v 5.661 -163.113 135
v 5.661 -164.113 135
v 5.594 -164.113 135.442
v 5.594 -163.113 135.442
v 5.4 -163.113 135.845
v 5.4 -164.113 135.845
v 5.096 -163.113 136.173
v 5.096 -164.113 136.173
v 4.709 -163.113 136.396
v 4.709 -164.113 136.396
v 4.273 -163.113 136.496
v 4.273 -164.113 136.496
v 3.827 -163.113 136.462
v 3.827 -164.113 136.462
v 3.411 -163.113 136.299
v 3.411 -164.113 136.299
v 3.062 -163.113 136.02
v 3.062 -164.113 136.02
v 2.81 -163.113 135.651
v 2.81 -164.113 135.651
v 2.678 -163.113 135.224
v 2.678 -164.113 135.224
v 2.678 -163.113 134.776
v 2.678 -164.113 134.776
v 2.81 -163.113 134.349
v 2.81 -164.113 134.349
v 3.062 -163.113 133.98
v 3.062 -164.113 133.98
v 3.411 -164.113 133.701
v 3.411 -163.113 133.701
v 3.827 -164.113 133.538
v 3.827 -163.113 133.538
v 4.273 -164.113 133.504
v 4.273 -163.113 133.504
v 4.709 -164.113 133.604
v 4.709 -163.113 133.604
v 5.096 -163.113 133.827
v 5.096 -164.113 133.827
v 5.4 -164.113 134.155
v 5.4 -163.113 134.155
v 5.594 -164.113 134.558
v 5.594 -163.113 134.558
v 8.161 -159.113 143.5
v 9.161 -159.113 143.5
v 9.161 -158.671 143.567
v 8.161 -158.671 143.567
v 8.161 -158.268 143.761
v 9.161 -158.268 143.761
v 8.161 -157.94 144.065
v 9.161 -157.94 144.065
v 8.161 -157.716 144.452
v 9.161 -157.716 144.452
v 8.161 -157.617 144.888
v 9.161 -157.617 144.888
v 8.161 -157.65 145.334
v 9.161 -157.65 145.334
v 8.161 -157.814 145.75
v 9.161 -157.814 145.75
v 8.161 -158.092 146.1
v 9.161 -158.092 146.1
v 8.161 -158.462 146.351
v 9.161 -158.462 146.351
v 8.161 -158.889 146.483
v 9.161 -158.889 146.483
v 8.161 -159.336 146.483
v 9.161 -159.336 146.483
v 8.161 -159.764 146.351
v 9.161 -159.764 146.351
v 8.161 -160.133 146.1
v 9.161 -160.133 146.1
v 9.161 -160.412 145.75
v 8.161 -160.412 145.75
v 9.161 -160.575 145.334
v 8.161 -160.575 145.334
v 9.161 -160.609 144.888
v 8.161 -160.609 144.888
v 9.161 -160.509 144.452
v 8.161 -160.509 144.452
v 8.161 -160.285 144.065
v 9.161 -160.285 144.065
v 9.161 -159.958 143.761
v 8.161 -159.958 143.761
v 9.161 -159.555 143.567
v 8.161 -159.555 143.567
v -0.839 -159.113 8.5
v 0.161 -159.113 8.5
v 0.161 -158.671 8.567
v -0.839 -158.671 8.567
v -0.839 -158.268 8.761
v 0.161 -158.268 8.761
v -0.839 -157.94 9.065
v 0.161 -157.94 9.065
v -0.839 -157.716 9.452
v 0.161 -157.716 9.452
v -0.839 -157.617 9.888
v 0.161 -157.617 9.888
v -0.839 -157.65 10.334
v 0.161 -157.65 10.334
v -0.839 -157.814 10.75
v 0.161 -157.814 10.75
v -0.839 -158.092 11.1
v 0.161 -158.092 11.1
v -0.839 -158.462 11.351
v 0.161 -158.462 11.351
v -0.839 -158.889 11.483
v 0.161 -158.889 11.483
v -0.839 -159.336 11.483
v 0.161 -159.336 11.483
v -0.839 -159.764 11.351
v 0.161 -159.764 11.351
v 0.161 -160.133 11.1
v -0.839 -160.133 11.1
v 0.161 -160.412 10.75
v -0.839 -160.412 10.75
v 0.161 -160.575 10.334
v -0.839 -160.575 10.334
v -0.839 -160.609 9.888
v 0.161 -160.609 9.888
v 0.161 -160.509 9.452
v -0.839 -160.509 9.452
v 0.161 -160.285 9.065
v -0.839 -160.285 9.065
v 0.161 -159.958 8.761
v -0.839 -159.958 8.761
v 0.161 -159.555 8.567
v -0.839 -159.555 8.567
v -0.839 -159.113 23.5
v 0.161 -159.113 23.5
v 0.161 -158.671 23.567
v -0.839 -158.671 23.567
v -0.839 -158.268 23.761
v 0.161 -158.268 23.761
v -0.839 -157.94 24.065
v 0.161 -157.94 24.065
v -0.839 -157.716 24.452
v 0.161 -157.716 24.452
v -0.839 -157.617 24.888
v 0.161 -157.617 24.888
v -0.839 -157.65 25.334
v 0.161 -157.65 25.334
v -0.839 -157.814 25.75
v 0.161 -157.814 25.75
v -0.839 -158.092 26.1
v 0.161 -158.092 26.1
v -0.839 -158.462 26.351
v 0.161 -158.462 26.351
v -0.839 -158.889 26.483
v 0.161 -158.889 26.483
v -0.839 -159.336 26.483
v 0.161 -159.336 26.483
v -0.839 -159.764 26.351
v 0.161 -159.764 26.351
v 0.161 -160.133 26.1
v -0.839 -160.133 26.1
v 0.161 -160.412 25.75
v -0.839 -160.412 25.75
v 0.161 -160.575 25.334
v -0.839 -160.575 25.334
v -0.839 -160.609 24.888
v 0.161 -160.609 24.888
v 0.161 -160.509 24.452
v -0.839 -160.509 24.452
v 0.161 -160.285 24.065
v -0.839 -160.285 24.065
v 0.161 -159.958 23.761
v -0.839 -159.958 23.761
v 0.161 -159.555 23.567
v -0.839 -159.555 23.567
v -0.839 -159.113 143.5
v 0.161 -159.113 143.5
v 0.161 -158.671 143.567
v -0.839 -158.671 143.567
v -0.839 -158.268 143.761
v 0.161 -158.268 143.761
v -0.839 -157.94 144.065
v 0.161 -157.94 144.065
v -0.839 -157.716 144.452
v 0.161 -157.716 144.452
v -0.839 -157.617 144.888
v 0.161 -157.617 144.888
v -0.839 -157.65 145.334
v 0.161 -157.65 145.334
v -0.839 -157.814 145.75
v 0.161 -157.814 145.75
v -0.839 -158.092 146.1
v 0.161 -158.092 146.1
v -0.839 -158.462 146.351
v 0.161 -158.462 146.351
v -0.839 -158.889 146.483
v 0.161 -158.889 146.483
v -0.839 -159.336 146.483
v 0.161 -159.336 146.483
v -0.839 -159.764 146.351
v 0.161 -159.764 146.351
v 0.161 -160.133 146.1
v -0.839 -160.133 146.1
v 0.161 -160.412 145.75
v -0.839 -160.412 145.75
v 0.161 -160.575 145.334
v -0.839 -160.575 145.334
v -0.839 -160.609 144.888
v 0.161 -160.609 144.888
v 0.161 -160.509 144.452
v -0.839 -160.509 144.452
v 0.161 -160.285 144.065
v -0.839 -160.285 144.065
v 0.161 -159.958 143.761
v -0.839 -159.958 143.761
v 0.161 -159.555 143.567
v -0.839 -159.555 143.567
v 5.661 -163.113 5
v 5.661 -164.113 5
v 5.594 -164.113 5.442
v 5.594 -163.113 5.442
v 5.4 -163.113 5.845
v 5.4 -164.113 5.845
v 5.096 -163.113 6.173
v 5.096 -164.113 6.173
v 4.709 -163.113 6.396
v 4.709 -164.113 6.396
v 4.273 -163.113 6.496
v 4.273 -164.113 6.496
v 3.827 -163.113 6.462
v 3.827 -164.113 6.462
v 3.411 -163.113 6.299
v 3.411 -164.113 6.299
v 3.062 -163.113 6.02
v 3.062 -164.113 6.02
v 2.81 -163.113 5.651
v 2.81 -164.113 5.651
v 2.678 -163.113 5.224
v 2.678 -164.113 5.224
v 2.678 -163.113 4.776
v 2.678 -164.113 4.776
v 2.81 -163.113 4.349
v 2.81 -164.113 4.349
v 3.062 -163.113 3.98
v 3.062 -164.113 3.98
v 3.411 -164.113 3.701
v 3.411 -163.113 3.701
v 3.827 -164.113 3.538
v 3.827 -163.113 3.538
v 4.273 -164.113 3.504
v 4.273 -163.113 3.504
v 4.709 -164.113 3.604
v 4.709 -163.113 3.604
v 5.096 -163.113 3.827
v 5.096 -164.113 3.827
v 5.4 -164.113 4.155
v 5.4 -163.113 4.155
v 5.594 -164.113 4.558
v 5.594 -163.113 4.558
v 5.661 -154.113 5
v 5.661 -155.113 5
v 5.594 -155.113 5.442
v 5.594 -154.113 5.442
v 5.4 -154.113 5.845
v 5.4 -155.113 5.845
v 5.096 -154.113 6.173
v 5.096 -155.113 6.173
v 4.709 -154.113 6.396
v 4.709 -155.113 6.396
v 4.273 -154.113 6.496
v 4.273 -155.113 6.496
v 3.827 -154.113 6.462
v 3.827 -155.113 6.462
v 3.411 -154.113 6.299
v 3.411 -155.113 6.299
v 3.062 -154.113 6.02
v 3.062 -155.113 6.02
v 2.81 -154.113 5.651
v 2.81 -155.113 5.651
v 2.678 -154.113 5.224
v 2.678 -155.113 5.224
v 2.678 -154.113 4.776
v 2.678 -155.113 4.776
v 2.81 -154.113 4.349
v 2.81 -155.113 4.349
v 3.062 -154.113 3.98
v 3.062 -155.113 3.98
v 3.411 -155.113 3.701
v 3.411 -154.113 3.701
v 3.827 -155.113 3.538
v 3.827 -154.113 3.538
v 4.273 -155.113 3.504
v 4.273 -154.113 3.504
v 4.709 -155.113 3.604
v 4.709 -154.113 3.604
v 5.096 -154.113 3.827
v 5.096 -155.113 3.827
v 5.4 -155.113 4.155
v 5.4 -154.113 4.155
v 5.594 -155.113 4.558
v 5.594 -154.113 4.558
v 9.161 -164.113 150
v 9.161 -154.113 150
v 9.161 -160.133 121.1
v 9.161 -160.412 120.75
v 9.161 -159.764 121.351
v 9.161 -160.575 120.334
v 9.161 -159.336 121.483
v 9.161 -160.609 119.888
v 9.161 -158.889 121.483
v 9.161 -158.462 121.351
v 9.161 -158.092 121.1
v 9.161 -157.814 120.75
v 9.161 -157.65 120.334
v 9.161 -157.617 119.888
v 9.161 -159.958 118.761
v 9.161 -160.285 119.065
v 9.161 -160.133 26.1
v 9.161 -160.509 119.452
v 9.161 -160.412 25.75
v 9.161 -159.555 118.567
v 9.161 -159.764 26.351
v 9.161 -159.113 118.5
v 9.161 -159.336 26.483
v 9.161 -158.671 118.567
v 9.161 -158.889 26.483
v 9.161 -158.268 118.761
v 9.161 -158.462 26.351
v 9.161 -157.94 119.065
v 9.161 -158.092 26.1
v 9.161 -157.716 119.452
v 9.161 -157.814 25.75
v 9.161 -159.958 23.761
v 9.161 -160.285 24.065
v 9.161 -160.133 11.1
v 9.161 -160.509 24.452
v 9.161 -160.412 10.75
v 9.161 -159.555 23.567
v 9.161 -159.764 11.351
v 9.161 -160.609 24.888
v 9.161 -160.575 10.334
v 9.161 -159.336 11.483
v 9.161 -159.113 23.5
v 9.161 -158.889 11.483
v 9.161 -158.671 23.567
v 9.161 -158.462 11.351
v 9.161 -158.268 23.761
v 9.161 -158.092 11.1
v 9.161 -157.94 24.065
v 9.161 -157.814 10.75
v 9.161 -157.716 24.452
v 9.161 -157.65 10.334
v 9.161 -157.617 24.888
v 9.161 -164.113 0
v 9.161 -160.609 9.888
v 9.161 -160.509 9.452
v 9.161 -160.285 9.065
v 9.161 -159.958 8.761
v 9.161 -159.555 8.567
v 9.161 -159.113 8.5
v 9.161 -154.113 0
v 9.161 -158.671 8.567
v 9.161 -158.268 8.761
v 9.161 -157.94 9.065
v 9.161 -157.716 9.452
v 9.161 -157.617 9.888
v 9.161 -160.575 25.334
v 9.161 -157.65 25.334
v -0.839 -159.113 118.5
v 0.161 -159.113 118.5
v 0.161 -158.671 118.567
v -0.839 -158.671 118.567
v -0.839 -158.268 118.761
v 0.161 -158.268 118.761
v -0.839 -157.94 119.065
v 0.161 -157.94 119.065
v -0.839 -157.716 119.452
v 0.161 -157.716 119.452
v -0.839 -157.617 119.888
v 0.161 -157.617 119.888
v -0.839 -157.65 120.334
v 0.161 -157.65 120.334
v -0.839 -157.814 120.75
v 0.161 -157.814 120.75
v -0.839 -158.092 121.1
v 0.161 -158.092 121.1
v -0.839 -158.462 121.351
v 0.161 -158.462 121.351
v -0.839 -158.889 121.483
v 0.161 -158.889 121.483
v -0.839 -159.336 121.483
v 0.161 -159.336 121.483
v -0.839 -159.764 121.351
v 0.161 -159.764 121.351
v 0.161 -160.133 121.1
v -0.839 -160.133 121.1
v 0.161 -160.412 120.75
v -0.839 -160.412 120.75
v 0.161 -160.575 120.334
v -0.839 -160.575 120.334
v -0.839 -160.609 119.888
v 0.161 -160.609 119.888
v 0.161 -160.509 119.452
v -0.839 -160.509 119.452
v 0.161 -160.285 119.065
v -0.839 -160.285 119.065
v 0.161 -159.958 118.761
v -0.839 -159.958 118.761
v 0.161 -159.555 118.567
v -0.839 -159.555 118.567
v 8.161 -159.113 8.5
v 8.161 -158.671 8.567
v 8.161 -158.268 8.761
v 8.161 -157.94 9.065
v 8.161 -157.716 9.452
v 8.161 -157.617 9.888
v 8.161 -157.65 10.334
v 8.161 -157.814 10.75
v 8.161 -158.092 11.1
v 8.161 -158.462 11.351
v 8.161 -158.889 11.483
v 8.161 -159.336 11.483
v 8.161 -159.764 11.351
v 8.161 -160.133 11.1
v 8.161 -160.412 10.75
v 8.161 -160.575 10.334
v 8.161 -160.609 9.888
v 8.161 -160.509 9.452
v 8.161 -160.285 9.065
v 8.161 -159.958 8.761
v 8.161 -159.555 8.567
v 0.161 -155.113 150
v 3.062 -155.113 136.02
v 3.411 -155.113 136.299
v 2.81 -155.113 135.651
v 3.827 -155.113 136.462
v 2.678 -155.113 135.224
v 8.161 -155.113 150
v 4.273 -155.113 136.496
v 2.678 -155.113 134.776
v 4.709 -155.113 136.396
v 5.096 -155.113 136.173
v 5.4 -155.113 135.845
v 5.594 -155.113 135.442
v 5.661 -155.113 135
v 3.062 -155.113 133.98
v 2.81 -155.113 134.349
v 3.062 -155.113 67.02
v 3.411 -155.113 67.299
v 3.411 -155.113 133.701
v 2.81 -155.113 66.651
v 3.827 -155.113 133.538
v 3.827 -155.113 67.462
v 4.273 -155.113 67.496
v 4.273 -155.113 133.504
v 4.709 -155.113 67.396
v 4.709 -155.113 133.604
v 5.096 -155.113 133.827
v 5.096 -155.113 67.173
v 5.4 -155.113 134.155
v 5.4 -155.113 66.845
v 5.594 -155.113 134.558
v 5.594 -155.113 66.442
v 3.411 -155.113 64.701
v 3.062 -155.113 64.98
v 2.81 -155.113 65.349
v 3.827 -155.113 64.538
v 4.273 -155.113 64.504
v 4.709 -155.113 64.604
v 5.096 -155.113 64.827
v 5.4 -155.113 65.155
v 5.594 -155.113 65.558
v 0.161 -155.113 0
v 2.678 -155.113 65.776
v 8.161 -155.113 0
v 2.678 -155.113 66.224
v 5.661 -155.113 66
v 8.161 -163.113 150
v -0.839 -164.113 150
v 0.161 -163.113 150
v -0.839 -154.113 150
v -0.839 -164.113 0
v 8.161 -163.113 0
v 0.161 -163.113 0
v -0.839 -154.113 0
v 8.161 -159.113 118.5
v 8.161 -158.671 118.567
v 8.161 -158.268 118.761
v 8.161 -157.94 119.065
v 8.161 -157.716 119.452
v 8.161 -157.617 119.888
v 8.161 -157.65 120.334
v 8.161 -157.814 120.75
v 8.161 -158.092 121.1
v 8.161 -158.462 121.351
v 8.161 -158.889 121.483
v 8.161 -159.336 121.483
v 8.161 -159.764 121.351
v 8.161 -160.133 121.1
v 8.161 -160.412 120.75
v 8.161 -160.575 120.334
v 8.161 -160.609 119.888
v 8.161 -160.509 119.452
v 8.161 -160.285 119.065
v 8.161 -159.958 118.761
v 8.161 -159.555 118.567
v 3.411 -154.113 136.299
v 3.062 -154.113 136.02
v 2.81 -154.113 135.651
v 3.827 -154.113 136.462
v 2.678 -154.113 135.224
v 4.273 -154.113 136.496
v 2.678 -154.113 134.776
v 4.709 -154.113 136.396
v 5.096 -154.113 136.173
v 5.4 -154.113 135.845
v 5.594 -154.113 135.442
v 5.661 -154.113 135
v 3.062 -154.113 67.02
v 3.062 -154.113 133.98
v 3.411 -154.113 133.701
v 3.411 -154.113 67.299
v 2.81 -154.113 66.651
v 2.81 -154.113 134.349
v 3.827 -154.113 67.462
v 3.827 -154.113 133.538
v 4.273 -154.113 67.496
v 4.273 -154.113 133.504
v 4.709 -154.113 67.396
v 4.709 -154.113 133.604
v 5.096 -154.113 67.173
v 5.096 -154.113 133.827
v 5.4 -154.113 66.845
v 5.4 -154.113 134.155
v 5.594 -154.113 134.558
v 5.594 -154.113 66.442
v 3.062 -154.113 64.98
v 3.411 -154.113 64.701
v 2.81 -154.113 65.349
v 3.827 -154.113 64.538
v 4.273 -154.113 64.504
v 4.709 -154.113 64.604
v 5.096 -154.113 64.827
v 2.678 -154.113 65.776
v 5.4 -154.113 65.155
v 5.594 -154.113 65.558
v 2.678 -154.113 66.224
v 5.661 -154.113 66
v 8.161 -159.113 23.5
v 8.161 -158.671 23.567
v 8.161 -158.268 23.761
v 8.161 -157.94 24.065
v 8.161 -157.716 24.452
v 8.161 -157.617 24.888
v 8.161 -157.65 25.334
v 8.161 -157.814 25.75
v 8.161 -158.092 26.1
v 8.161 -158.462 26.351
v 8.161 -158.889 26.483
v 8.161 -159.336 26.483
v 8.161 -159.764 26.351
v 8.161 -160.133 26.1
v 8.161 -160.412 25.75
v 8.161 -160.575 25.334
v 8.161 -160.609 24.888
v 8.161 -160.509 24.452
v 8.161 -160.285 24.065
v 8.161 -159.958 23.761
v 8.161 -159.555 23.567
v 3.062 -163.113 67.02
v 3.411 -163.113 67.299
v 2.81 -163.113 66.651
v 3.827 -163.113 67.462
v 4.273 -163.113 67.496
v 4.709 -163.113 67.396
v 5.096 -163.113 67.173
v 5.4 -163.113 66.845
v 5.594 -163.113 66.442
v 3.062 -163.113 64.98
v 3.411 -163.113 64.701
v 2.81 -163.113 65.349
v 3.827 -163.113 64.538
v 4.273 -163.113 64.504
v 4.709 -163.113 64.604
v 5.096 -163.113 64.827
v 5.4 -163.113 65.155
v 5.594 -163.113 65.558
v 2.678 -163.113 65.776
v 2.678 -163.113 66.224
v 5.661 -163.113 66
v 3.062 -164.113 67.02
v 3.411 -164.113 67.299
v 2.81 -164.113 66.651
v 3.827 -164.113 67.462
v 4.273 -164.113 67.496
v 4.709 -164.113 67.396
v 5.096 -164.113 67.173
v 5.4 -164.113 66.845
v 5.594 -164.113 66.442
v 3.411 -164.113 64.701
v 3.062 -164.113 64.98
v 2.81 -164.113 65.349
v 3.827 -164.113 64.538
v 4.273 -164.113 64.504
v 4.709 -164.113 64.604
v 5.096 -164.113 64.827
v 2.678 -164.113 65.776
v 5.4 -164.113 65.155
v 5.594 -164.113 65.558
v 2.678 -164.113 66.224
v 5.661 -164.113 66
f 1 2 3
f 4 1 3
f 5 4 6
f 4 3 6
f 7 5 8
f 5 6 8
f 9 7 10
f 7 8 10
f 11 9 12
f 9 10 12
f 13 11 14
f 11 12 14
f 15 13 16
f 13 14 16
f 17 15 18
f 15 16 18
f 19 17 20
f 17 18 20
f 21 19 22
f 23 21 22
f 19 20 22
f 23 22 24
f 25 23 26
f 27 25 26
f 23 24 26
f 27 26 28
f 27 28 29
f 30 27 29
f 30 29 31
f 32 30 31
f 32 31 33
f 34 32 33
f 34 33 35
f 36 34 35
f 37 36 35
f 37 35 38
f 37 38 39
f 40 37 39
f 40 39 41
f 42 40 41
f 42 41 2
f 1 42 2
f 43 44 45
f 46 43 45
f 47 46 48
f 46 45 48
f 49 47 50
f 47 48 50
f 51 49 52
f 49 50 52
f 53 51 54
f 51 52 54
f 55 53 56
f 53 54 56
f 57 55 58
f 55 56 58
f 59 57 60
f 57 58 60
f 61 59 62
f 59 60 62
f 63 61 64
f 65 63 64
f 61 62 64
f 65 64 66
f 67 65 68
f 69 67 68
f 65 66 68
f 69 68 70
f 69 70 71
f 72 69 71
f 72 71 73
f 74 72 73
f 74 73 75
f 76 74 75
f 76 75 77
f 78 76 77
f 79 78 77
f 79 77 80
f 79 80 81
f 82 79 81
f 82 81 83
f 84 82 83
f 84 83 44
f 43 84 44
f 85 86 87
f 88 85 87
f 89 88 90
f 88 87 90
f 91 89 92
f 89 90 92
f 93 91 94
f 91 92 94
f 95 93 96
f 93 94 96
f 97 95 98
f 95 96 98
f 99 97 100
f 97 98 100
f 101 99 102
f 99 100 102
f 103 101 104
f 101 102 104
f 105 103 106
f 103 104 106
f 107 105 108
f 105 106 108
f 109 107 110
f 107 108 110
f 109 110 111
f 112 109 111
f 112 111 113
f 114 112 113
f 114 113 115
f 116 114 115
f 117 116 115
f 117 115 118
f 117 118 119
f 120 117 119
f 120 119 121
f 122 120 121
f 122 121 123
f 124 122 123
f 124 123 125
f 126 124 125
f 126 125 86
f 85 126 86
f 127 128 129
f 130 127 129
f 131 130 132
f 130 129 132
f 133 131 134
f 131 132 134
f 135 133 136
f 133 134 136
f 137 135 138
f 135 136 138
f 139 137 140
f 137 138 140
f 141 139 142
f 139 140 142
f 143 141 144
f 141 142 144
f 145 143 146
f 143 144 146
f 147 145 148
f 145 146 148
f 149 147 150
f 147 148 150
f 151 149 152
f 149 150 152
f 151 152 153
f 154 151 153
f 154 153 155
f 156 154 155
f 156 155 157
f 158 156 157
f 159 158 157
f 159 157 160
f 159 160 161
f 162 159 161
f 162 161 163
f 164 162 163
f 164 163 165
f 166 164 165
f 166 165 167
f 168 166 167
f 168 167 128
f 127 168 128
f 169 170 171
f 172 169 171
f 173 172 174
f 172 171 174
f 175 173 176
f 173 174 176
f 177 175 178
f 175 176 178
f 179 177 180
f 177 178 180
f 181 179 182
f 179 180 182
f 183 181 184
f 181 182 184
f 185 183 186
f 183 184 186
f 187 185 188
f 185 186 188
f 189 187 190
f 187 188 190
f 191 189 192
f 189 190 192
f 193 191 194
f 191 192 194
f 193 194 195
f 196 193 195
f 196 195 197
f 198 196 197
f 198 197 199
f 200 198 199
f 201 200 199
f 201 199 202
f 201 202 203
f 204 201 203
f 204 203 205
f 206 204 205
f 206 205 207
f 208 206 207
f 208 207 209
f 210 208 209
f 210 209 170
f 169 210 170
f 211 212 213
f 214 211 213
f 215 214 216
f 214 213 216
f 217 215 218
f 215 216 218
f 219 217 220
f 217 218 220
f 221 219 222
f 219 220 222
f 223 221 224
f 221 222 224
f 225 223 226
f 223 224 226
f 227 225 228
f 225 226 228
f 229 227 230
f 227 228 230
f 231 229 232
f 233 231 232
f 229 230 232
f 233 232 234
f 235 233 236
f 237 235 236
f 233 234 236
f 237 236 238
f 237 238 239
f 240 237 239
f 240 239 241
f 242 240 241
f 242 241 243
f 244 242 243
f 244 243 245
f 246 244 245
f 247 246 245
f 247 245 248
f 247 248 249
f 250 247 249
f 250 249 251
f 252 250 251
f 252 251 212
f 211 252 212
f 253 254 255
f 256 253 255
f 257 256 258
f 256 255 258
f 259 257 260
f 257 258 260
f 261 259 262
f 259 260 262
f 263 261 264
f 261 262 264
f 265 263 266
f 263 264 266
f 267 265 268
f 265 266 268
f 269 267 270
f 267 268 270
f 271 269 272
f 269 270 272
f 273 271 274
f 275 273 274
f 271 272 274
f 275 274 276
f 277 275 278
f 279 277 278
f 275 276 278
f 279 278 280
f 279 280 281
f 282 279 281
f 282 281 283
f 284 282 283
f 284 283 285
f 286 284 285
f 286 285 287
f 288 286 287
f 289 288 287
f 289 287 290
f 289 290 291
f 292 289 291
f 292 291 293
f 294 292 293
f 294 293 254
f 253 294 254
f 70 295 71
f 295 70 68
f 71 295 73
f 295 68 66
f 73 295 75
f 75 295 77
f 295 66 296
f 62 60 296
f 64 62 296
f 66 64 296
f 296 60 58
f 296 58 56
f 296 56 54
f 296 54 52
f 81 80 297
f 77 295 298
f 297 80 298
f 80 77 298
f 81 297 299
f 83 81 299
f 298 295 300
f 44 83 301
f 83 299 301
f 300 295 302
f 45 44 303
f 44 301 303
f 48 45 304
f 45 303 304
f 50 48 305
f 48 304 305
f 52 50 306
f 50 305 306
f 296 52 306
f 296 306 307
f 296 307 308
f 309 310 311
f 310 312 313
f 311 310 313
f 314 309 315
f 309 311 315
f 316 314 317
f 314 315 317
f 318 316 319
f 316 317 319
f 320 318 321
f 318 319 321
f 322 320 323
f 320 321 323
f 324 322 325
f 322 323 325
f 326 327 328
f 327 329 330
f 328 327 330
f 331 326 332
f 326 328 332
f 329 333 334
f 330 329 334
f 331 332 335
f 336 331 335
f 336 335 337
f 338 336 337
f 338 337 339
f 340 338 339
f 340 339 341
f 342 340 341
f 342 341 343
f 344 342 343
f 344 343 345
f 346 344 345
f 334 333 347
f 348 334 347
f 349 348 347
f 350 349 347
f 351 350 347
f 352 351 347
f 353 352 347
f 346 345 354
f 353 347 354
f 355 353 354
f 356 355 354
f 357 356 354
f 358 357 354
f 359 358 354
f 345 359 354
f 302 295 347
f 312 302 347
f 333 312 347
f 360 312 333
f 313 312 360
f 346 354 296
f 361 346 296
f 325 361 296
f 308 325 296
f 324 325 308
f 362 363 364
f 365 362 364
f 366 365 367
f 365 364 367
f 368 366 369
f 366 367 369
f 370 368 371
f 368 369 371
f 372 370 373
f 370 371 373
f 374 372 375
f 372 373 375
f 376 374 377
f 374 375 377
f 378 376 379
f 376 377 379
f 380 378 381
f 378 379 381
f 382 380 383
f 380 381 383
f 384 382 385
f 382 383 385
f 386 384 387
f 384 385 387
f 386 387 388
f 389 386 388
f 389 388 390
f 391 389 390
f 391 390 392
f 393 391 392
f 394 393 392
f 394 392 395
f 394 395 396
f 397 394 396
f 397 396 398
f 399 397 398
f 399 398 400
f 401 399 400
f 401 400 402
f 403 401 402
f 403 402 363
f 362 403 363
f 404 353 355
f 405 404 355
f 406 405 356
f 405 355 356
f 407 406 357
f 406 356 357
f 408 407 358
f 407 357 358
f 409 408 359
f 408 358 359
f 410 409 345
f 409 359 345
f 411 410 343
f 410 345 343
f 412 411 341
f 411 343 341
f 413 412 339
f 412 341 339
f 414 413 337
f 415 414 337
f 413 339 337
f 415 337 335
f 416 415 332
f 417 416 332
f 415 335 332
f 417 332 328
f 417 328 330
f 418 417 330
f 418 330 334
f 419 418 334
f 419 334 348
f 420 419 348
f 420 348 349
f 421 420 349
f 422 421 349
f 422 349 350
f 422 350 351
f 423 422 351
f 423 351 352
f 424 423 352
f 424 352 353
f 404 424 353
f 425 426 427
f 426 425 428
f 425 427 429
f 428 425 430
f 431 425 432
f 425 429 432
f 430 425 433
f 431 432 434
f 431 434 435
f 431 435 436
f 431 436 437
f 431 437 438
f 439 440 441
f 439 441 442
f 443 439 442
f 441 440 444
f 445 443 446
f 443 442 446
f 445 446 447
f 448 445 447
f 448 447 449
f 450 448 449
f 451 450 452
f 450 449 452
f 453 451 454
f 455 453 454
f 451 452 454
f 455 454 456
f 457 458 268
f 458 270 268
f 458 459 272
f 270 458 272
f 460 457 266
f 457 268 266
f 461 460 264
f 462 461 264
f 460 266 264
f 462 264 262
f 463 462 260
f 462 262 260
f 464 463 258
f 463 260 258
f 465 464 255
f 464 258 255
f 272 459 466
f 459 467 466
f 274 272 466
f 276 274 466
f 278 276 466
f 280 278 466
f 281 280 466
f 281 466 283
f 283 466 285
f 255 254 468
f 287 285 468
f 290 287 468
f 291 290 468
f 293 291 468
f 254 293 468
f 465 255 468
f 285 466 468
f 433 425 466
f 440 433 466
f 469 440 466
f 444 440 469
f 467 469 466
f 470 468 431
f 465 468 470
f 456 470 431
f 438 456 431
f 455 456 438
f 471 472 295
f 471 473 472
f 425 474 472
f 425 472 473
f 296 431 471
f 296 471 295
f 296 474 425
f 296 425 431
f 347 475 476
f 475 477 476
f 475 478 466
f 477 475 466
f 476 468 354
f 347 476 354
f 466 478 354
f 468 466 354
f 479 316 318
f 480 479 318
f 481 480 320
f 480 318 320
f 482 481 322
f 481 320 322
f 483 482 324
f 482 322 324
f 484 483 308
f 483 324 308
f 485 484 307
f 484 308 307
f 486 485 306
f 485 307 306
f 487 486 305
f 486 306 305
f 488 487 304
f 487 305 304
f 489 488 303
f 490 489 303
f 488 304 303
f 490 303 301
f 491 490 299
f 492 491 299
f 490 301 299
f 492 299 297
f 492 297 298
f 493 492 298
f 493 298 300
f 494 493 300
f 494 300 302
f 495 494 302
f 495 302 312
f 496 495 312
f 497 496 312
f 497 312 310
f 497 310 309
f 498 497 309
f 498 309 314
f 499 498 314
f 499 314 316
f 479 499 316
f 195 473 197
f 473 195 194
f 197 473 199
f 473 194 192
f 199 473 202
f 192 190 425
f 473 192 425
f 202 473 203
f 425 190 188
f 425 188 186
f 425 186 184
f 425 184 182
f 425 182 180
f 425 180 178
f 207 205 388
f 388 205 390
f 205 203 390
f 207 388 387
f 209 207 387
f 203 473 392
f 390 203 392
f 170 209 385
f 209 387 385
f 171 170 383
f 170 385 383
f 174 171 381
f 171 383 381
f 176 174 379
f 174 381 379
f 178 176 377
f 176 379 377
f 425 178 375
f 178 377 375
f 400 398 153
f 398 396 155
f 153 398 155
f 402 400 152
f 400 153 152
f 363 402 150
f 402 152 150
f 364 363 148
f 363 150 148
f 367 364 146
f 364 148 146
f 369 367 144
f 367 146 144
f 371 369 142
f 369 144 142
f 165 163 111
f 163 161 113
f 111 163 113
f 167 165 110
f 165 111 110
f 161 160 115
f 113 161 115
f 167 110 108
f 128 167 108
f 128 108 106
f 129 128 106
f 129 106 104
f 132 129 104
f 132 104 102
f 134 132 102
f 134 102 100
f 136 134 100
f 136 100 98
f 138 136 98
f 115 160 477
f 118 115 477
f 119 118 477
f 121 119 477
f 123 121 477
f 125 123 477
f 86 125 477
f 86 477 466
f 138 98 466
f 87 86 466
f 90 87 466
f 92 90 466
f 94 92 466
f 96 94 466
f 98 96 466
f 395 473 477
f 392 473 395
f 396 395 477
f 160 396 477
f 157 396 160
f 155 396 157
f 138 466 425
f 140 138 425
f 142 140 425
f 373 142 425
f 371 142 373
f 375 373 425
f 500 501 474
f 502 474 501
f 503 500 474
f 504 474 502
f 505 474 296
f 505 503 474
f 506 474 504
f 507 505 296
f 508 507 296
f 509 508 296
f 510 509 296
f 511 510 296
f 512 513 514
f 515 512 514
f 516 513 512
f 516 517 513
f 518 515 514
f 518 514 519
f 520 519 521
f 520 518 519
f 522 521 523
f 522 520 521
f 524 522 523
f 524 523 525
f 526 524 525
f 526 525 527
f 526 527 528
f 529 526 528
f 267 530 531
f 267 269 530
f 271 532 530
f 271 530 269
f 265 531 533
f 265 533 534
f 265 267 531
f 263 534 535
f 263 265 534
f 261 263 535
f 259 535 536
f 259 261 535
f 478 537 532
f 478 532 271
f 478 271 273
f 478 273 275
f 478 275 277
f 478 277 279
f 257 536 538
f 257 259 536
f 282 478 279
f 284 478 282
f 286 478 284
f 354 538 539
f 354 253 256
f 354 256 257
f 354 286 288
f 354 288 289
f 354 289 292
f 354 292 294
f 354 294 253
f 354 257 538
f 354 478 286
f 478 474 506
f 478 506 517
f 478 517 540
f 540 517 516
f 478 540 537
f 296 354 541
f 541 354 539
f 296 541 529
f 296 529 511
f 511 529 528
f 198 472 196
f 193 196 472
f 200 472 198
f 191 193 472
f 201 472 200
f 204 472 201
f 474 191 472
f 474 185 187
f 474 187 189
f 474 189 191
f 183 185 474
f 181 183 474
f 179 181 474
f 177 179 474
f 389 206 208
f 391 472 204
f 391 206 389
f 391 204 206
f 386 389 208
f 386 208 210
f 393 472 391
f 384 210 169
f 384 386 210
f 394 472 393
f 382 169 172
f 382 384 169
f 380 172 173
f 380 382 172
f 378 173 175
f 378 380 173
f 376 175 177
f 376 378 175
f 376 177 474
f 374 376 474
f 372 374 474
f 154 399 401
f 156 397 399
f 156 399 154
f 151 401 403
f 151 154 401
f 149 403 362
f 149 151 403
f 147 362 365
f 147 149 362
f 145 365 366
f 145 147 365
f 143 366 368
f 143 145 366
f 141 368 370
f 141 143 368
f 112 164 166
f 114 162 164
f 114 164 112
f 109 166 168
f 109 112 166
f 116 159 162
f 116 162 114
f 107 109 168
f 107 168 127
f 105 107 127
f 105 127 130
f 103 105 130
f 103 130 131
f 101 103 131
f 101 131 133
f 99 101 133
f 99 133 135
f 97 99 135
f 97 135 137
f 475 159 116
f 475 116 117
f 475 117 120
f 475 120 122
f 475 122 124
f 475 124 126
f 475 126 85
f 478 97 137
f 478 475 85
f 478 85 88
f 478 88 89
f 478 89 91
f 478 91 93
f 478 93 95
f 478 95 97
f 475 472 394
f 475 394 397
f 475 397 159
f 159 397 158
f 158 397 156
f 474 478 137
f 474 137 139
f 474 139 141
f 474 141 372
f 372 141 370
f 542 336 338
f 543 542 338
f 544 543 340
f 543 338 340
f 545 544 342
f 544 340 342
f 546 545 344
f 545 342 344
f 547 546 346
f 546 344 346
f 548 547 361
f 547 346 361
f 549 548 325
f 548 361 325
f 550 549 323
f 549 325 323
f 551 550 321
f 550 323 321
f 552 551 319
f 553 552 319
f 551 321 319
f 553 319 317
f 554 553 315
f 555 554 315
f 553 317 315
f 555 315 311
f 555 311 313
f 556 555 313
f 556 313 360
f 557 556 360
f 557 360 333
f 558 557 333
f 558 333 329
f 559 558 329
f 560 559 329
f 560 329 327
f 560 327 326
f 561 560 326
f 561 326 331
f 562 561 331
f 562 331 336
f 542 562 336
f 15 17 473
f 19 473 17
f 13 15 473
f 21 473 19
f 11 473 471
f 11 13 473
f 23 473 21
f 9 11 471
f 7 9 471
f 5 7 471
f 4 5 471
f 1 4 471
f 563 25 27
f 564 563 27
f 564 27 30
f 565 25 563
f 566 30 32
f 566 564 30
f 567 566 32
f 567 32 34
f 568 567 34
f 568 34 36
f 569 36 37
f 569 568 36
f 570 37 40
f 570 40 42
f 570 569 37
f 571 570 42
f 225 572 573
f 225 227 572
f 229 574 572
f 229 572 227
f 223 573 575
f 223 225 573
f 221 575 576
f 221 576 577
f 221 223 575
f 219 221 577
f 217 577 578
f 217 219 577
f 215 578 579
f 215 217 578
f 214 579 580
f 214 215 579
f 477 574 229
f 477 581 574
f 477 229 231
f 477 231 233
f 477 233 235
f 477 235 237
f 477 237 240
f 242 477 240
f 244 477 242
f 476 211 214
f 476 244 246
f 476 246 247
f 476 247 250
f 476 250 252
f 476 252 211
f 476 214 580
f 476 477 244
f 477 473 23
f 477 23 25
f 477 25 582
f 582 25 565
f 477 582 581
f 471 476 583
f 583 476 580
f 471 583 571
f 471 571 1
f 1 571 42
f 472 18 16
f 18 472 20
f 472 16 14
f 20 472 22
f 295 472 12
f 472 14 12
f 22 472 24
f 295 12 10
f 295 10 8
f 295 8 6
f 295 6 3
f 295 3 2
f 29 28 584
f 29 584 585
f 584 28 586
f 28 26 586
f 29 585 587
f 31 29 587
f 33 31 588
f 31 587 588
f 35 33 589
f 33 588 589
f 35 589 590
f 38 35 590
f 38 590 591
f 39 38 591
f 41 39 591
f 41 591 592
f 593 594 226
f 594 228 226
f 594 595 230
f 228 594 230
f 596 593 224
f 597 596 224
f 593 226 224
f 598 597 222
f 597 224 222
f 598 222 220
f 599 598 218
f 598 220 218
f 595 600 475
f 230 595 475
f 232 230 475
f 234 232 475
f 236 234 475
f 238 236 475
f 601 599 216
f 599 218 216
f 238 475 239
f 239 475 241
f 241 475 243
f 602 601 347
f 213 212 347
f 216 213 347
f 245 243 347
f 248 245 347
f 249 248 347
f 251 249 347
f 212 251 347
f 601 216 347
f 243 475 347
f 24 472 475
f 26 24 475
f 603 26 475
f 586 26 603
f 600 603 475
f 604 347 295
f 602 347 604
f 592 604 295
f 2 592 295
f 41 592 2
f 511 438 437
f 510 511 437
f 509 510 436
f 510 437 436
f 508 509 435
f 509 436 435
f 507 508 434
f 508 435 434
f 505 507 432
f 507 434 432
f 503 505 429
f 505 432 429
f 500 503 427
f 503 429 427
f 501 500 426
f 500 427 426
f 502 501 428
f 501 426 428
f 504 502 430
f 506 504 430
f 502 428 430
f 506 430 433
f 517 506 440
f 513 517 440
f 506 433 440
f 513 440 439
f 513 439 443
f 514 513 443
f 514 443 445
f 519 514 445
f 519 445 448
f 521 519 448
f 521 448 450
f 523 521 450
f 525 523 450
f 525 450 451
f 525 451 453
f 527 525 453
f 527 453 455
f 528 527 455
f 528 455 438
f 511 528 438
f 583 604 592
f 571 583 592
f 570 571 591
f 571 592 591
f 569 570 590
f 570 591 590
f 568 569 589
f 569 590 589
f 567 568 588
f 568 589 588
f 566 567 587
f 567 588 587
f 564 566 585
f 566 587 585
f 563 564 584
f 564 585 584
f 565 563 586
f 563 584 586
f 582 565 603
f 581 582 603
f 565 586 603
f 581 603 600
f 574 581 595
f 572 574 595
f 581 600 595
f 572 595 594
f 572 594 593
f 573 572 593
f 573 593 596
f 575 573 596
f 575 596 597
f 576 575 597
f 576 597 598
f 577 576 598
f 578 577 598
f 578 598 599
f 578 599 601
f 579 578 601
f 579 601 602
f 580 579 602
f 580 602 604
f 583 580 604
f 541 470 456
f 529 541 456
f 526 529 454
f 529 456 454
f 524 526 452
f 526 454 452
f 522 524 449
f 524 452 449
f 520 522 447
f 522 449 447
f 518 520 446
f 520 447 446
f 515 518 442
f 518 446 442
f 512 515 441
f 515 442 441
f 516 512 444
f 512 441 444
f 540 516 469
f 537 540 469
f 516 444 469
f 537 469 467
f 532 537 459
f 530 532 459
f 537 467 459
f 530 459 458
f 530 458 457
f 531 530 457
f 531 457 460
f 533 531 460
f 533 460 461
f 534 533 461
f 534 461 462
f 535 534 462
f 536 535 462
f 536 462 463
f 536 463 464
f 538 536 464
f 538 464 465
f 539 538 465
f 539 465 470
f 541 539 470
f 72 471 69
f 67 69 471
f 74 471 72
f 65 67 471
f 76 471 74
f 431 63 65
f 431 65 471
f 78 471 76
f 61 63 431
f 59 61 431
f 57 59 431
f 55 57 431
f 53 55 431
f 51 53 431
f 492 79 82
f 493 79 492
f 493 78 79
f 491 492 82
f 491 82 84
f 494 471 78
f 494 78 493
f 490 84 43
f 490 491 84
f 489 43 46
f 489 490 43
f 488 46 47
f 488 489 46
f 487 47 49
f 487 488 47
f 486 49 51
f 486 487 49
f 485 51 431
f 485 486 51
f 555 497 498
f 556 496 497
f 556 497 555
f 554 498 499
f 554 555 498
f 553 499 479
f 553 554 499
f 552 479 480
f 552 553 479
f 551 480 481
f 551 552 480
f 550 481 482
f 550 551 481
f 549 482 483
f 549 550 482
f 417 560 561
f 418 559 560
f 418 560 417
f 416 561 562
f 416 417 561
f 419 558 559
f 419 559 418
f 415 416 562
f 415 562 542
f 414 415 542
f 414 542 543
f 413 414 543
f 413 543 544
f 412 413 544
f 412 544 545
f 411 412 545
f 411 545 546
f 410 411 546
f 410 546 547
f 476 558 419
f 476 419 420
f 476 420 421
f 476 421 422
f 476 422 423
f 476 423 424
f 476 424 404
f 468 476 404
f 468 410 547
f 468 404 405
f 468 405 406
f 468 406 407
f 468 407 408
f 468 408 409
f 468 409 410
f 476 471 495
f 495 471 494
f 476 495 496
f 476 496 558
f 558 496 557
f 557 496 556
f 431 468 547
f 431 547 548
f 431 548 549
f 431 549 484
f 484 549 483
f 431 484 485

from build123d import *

# Parameters (mm, degrees)
SKETCH_1_W          = 10
SKETCH_1_H          = 10
SKETCH_1_W_2        = 8
SKETCH_1_H_2        = 8
EXTRUDE_1_DEPTH     = 150
SKETCH_2_R          = 1.5
CUT_EXTRUDE_1_DEPTH = 11
SKETCH_3_R          = 1.5
CUT_EXTRUDE_2_DEPTH = 11


with BuildPart() as part:
    # 草图1 → 拉伸-薄壁1 (new body)
    with BuildSketch(Plane.XY):
        with Locations((4.161089293, -159.112745336)):
            Rectangle(SKETCH_1_W, SKETCH_1_H)
        with Locations((4.161089293, -159.112745336)):
            Rectangle(SKETCH_1_W_2, SKETCH_1_H_2, mode=Mode.SUBTRACT)
    extrude(amount=EXTRUDE_1_DEPTH)

    # 草图2 → 切除-拉伸1 (cut, through all)
    with BuildSketch(Plane.XZ.offset(164.112745336)):
        with Locations((4.161089293, 135)):
            Circle(SKETCH_2_R)
        with Locations((4.161089293, 66)):
            Circle(SKETCH_2_R)
        with Locations((4.161089293, 5)):
            Circle(SKETCH_2_R)
    extrude(amount=-CUT_EXTRUDE_1_DEPTH, mode=Mode.SUBTRACT)

    # 草图3 → 切除-拉伸2 (cut, through all)
    with BuildSketch(Plane(origin=(9.161089293, 0, 0), x_dir=(0, 0, -1), z_dir=(1, 0, 0))):
        with Locations((-25, -159.112745336)):
            Circle(SKETCH_3_R)
        with Locations((-10, -159.112745336)):
            Circle(SKETCH_3_R)
        with Locations((-120, -159.112745336)):
            Circle(SKETCH_3_R)
        with Locations((-145, -159.112745336)):
            Circle(SKETCH_3_R)
    extrude(amount=-CUT_EXTRUDE_2_DEPTH, mode=Mode.SUBTRACT)


solid = part.part
